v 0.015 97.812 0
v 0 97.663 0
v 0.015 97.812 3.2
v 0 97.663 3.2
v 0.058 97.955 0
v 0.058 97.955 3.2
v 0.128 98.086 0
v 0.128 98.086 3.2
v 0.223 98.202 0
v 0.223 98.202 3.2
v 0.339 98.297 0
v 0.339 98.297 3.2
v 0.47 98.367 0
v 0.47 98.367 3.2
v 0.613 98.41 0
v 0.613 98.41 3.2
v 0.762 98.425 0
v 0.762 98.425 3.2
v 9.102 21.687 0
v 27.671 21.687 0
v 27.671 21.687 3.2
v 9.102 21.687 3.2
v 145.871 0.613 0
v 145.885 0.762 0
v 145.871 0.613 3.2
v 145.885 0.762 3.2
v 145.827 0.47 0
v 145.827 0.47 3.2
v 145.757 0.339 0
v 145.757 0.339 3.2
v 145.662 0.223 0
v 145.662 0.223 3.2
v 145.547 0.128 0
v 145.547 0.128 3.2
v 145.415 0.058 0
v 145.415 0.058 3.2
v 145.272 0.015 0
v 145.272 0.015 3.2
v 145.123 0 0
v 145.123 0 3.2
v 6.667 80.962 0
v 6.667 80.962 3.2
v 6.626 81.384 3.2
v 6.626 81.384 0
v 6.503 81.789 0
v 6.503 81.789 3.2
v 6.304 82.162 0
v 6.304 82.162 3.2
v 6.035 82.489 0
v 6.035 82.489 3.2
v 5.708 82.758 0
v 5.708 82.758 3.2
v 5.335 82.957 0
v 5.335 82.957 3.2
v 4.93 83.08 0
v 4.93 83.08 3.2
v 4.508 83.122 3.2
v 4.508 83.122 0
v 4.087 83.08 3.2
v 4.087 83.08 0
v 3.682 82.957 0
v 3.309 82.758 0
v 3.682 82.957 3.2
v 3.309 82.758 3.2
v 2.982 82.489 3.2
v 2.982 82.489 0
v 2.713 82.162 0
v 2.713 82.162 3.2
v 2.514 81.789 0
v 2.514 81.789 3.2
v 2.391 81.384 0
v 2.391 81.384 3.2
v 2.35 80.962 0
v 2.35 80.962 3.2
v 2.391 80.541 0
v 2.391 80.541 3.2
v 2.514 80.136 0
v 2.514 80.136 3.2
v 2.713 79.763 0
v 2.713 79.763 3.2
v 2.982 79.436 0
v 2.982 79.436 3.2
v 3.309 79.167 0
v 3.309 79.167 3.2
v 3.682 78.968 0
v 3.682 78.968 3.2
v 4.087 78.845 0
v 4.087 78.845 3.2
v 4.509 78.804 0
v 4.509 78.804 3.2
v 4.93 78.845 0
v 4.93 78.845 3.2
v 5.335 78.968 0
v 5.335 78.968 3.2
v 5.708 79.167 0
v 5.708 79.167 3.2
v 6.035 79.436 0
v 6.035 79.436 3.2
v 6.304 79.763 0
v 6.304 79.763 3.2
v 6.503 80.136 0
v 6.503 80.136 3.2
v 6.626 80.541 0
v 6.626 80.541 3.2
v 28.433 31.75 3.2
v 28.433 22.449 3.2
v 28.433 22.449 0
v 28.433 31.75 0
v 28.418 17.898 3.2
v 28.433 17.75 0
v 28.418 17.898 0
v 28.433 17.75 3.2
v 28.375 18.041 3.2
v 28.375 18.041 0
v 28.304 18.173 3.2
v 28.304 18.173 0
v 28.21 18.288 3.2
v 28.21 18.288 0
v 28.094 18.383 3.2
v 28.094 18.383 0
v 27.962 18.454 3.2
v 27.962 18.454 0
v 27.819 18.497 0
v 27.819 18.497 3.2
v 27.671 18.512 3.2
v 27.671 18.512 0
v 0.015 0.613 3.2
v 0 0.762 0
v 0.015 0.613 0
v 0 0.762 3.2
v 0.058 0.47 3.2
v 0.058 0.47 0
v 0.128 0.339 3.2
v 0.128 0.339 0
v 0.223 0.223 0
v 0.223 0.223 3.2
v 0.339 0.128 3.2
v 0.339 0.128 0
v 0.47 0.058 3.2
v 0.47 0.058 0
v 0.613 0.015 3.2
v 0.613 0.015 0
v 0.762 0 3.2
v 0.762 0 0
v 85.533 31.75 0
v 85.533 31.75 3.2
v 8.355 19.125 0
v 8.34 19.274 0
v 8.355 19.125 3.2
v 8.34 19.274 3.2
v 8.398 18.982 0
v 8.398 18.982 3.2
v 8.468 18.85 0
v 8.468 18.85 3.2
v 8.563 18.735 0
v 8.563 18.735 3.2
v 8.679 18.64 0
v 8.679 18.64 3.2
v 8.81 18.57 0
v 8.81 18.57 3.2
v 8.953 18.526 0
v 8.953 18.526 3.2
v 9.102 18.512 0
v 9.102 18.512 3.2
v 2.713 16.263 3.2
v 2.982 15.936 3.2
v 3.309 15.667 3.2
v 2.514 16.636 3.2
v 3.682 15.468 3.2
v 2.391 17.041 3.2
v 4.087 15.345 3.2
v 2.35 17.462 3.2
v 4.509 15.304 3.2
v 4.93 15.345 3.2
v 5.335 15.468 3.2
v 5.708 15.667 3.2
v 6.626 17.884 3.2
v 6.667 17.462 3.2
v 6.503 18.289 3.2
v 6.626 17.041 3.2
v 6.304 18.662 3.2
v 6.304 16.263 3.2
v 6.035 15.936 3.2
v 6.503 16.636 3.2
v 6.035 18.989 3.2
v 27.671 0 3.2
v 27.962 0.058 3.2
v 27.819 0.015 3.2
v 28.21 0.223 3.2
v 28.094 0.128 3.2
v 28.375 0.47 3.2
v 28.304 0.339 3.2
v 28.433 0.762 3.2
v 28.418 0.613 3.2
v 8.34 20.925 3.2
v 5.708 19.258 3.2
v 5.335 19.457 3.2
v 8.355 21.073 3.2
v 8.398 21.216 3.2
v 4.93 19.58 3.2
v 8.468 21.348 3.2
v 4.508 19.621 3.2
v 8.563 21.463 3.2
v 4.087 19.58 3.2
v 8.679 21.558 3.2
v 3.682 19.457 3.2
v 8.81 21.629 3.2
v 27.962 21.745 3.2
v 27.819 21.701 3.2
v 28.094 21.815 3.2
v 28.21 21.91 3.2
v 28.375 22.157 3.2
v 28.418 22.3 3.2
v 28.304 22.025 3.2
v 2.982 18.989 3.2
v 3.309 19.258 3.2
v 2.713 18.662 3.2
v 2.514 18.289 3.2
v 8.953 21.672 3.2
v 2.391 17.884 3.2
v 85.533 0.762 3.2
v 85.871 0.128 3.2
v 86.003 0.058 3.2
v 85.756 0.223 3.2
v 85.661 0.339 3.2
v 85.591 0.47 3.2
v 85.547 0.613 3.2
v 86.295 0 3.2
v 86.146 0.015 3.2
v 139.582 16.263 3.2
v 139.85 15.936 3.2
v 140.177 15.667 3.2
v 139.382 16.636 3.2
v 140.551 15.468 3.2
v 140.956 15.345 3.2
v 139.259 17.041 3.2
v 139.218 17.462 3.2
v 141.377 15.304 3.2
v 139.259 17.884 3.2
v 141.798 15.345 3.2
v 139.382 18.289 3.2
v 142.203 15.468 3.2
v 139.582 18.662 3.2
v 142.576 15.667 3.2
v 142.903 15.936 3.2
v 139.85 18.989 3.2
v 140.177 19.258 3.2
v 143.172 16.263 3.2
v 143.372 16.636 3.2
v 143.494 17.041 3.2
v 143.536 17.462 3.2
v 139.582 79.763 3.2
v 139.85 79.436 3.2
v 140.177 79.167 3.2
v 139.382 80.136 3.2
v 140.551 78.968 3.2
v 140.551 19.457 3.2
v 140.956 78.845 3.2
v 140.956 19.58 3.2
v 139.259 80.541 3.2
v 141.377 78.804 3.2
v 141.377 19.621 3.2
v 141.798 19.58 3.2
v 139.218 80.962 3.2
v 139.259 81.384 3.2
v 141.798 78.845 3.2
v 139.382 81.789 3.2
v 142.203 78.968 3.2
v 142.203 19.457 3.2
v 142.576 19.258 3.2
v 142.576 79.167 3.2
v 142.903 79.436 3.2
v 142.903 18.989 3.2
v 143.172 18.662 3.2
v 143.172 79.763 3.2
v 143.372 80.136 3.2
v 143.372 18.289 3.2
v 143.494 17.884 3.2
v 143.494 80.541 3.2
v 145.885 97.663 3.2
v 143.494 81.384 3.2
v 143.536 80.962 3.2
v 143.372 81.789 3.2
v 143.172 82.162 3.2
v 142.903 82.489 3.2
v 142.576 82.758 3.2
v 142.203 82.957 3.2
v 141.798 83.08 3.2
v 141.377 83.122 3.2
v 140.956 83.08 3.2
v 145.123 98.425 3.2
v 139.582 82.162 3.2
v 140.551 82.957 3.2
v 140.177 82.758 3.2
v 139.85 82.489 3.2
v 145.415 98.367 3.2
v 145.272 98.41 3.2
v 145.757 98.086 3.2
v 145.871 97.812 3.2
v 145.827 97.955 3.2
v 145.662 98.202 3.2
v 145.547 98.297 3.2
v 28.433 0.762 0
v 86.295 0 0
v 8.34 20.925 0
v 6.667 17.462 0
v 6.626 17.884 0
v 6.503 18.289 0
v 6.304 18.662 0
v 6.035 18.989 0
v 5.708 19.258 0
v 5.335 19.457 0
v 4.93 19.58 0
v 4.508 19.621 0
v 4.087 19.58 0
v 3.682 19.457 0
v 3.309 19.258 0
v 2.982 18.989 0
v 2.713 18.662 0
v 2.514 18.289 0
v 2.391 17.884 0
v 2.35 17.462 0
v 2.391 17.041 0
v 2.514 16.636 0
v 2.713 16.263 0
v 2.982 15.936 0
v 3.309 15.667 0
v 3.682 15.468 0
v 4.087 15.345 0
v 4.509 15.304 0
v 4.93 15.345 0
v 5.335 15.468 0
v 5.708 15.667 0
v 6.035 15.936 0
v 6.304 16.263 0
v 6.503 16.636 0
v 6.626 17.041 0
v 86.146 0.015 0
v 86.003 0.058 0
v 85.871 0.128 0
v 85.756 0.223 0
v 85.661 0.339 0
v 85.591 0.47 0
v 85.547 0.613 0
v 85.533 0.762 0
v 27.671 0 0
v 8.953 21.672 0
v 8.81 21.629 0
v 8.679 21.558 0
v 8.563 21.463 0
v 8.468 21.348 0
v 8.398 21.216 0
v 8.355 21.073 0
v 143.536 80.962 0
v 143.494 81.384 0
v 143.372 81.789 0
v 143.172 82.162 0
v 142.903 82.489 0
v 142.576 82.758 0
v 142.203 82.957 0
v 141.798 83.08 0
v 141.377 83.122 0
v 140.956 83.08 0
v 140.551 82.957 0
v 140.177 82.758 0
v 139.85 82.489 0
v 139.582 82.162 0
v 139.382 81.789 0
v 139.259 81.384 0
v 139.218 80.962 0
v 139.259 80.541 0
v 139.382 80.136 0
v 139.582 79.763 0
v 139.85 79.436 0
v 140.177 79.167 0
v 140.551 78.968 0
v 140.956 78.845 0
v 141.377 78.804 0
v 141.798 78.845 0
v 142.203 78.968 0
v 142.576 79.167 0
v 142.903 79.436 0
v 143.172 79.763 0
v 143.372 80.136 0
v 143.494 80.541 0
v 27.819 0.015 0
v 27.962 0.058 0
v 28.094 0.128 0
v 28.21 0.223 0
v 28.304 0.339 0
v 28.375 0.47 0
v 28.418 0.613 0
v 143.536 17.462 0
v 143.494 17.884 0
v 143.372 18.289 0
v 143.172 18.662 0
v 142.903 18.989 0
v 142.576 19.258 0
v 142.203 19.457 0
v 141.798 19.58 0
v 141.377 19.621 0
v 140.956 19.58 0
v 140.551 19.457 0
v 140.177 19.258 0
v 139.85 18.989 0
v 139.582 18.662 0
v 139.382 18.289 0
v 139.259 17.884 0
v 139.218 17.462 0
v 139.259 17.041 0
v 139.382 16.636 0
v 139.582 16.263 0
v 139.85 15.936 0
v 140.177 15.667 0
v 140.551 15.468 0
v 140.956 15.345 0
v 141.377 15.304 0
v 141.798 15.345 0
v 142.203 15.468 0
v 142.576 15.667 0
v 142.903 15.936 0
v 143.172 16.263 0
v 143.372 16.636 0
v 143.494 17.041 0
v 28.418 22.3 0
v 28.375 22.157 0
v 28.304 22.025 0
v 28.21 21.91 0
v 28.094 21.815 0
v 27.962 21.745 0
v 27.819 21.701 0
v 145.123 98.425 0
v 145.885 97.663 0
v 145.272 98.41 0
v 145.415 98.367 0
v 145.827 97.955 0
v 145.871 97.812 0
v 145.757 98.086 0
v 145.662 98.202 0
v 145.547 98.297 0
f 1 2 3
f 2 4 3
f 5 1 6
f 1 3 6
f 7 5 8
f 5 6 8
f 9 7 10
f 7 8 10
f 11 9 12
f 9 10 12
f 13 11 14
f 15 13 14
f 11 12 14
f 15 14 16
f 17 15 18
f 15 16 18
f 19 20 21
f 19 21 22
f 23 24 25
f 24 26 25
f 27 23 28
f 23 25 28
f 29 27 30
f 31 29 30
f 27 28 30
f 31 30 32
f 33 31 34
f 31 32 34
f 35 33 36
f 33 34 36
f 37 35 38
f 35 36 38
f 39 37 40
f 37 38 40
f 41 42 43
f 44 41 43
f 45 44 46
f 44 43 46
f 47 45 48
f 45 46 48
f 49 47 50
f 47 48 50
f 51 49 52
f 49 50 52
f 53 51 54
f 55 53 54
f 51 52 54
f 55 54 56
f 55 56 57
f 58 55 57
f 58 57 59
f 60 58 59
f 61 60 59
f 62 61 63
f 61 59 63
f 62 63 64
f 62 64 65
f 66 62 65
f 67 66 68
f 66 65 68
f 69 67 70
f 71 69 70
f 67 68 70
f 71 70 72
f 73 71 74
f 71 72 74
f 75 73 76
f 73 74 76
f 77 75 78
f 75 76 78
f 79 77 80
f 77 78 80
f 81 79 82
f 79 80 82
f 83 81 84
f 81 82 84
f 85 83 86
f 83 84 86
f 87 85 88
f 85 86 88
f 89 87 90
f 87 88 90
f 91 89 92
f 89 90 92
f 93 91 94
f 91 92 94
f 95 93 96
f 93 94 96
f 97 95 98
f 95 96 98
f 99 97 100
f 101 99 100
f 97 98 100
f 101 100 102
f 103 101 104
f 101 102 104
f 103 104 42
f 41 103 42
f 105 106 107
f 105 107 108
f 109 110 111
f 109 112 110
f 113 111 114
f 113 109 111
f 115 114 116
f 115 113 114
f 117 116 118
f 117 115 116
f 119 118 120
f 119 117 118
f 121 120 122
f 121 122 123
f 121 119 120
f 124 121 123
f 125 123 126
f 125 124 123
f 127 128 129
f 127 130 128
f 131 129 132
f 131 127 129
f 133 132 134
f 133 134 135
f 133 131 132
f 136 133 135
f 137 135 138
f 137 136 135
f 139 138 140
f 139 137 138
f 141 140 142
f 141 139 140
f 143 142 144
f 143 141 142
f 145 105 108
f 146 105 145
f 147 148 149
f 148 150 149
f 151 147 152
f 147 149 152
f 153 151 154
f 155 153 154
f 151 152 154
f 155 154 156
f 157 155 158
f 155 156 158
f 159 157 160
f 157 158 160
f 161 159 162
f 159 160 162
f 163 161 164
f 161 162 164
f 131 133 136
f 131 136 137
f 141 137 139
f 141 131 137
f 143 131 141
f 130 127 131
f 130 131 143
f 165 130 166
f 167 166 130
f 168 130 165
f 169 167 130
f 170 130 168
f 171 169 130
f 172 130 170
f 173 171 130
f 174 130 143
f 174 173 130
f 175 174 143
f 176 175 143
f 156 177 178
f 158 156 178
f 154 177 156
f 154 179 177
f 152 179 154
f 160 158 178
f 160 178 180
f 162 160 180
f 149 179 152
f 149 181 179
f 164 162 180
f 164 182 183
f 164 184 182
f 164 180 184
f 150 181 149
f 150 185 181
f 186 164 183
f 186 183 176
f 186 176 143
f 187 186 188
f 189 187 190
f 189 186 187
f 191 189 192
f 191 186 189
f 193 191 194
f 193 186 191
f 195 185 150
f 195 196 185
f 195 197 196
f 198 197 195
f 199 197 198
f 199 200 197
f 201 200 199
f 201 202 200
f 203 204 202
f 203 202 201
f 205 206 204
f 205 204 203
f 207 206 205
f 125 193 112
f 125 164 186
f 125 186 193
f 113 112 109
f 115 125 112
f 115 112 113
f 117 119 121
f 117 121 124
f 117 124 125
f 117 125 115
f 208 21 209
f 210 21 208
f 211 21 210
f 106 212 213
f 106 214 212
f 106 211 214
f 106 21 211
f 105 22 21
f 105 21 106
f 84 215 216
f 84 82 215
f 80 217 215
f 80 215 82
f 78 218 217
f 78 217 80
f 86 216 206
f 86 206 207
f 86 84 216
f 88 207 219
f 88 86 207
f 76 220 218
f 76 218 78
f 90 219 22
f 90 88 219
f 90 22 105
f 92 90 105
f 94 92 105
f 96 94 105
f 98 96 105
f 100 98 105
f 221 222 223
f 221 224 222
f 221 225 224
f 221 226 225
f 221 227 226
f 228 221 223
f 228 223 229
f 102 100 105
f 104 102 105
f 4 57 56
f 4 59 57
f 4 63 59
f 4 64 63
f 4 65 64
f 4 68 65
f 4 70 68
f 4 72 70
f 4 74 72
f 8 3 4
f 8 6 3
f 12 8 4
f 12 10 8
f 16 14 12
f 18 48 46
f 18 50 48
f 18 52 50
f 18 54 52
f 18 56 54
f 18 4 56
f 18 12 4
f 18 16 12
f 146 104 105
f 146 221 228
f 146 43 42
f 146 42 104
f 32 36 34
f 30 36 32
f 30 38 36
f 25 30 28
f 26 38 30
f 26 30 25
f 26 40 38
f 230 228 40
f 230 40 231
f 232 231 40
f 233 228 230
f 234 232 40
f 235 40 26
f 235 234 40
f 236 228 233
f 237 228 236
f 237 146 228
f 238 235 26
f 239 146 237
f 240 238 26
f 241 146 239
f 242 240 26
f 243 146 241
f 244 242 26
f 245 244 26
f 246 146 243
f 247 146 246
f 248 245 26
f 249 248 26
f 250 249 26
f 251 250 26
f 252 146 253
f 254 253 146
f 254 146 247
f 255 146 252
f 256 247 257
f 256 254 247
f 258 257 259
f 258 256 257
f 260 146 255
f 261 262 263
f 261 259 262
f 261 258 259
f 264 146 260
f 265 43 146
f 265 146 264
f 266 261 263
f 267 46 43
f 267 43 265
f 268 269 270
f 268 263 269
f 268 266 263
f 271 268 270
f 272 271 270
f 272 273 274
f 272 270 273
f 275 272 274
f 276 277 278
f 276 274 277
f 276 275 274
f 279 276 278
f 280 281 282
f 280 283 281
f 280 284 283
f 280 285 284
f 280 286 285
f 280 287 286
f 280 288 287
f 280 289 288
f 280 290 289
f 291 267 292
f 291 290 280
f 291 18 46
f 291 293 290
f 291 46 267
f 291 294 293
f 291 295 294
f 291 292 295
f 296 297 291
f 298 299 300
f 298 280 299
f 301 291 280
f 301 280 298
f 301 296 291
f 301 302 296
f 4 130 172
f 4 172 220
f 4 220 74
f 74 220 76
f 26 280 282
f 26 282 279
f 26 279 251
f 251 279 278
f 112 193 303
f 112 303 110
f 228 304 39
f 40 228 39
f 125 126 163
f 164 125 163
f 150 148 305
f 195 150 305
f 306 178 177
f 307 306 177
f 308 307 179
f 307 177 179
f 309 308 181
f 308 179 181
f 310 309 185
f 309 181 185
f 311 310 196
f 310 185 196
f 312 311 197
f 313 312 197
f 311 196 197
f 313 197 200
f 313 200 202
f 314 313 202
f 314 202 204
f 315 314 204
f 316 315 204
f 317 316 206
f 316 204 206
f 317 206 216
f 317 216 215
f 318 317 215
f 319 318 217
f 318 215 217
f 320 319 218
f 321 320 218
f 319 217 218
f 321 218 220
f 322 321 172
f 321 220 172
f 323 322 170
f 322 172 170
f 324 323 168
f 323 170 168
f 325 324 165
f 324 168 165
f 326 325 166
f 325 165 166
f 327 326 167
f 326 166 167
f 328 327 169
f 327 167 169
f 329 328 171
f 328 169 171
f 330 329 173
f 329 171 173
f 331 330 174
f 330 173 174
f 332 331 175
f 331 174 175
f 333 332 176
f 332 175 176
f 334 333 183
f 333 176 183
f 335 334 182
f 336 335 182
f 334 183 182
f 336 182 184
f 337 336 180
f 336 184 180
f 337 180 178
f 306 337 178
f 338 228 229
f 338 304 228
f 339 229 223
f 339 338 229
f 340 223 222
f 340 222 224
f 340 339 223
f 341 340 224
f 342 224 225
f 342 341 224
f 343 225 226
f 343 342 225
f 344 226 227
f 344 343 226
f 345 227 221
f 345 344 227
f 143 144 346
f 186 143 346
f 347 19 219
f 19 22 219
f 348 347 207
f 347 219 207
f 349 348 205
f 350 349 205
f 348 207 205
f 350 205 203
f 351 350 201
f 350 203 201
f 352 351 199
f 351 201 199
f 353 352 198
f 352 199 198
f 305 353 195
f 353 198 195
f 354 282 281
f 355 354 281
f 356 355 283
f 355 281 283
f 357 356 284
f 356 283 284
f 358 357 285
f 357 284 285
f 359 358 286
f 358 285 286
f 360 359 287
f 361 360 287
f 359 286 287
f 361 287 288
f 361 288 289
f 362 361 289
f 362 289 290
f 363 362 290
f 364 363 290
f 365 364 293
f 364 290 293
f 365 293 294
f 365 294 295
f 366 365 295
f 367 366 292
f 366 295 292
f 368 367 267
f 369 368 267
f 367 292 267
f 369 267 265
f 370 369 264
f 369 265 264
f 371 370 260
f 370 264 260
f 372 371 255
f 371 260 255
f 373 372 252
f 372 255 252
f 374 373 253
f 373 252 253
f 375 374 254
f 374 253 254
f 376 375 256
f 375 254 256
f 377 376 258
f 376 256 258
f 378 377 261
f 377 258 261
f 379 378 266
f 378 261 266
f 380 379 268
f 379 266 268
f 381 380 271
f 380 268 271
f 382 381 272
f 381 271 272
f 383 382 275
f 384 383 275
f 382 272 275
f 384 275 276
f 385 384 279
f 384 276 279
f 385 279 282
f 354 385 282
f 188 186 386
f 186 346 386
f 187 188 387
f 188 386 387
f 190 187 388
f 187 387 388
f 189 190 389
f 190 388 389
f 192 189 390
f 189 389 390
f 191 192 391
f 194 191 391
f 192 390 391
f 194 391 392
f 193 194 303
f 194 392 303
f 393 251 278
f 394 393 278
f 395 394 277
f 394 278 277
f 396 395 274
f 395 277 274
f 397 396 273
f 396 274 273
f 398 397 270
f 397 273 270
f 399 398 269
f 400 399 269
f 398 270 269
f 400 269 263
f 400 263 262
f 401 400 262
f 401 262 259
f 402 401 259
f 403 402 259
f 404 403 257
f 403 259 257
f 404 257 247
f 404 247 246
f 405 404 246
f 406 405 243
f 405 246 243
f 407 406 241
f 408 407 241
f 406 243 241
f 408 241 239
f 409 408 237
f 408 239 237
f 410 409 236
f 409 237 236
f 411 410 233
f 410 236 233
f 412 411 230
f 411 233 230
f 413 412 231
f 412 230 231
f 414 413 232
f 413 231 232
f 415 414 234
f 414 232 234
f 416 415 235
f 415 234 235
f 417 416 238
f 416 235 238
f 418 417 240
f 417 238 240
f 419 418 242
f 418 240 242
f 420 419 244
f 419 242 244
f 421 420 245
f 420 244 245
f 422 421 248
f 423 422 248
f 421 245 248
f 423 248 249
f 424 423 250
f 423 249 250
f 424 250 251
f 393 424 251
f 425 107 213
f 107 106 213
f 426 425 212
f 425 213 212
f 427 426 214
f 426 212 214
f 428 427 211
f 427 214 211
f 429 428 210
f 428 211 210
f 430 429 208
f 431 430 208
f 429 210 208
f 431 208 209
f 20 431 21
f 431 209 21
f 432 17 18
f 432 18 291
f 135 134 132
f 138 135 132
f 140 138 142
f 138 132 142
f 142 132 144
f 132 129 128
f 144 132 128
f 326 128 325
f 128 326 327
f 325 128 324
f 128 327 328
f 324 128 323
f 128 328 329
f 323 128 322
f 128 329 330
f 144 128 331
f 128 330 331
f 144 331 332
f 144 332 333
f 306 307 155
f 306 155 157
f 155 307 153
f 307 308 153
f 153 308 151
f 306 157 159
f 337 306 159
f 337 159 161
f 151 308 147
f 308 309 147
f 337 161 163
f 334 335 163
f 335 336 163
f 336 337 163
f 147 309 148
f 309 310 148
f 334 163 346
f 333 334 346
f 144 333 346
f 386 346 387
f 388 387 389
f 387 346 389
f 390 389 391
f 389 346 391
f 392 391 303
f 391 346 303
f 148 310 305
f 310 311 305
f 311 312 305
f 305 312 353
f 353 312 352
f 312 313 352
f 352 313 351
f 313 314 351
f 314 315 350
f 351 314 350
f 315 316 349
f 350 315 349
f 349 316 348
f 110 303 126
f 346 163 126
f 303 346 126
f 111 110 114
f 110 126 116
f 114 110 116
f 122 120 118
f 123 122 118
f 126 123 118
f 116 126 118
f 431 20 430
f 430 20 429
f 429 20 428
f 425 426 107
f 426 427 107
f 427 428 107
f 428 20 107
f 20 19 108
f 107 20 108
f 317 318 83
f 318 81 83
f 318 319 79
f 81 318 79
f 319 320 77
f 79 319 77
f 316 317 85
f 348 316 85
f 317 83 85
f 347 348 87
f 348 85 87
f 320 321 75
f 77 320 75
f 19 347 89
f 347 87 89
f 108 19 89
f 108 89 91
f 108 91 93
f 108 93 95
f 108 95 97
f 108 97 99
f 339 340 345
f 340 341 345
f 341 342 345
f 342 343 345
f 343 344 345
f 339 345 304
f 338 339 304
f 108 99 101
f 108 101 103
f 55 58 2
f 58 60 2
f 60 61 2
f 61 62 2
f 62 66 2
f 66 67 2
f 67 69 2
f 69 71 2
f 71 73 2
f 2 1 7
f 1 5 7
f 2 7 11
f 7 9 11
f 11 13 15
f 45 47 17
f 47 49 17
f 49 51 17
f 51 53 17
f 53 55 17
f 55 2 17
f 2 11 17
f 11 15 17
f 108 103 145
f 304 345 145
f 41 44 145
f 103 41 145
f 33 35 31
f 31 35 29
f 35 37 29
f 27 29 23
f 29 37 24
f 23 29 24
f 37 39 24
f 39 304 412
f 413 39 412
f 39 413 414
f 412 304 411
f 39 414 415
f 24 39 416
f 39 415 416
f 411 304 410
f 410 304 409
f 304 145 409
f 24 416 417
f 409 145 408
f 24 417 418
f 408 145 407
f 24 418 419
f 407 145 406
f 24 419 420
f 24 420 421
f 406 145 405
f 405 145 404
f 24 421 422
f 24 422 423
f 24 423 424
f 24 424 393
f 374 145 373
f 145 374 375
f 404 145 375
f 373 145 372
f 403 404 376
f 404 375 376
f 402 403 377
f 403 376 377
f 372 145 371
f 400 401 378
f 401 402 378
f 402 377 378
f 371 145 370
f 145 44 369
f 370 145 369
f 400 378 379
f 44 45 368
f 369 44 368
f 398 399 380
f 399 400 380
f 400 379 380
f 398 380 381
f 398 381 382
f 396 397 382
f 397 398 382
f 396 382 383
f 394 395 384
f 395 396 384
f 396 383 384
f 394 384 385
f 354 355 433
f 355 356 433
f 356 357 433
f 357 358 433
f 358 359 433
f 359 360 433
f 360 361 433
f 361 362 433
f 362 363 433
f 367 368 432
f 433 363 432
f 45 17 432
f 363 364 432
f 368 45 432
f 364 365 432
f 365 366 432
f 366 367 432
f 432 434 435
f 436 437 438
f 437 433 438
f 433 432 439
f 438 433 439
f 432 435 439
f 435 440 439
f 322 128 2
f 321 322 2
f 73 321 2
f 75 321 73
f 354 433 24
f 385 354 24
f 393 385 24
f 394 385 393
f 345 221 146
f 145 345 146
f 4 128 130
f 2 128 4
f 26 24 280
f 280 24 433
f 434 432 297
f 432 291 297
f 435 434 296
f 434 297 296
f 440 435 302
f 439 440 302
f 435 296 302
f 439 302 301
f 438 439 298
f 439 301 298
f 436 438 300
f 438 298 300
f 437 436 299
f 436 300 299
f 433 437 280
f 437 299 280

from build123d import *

# Parameters (mm, degrees)
SKETCH1_W           = 145.885353282
SKETCH1_H           = 98.425
BOSS_EXTRUDE1_DEPTH = 3.2004
SKETCH4_W           = 57.100000132
SKETCH4_H           = 31.75
CUT_EXTRUDE1_DEPTH  = 3.2004
SKETCH5_R           = 2.159
CUT_EXTRUDE2_DEPTH  = 3.2004
SKETCH7_W           = 20.092850022
SKETCH7_H           = 3.175
CUT_EXTRUDE4_DEPTH  = 3.2004
FILLET1_R           = 0.762


with BuildPart() as part:
    # Sketch1 → Boss-Extrude1 (new body)
    with BuildSketch(Plane.XY):
        with Locations((72.942676641, 49.2125)):
            Rectangle(SKETCH1_W, SKETCH1_H)
    extrude(amount=BOSS_EXTRUDE1_DEPTH)

    # Sketch4 → Cut-Extrude1 (cut)
    with BuildSketch(Plane.XY.offset(3.2004)):
        with Locations((56.982760066, 15.875)):
            Rectangle(SKETCH4_W, SKETCH4_H)
    extrude(amount=-CUT_EXTRUDE1_DEPTH, mode=Mode.SUBTRACT)

    # Sketch5 → Cut-Extrude2 (cut)
    with BuildSketch(Plane.XY.offset(3.2004)):
        with Locations((141.376853282, 80.9625)):
            Circle(SKETCH5_R)
        with Locations((141.376853282, 17.4625)):
            Circle(SKETCH5_R)
        with Locations((4.5085, 17.4625)):
            Circle(SKETCH5_R)
        with Locations((4.5085, 80.9625)):
            Circle(SKETCH5_R)
    extrude(amount=-CUT_EXTRUDE2_DEPTH, mode=Mode.SUBTRACT)

    # Sketch7 → Cut-Extrude4 (cut)
    with BuildSketch(Plane(origin=(0, 0, 0), x_dir=(-1, 0, 0), z_dir=(0, 0, -1))):
        with Locations((-18.386334989, 20.09902)):
            Rectangle(SKETCH7_W, SKETCH7_H)
    extrude(amount=-CUT_EXTRUDE4_DEPTH, mode=Mode.SUBTRACT)

    # Fillet1
    fillet1_edges = [part.edges().sort_by_distance(p)[0] for p in [
        (28.43276, 0, 1.6002),
        (85.532760132, 0, 1.6002),
        (8.339909978, 18.51152, 1.6002),
        (8.339909978, 21.68652, 1.6002),
        (28.43276, 21.68652, 1.6002),
        (28.43276, 18.51152, 1.6002),
        (0, 98.425, 1.6002),
        (145.885353282, 98.425, 1.6002),
        (145.885353282, 0, 1.6002),
        (0, 0, 1.6002),
    ]]
    fillet(fillet1_edges, radius=FILLET1_R)


solid = part.part
